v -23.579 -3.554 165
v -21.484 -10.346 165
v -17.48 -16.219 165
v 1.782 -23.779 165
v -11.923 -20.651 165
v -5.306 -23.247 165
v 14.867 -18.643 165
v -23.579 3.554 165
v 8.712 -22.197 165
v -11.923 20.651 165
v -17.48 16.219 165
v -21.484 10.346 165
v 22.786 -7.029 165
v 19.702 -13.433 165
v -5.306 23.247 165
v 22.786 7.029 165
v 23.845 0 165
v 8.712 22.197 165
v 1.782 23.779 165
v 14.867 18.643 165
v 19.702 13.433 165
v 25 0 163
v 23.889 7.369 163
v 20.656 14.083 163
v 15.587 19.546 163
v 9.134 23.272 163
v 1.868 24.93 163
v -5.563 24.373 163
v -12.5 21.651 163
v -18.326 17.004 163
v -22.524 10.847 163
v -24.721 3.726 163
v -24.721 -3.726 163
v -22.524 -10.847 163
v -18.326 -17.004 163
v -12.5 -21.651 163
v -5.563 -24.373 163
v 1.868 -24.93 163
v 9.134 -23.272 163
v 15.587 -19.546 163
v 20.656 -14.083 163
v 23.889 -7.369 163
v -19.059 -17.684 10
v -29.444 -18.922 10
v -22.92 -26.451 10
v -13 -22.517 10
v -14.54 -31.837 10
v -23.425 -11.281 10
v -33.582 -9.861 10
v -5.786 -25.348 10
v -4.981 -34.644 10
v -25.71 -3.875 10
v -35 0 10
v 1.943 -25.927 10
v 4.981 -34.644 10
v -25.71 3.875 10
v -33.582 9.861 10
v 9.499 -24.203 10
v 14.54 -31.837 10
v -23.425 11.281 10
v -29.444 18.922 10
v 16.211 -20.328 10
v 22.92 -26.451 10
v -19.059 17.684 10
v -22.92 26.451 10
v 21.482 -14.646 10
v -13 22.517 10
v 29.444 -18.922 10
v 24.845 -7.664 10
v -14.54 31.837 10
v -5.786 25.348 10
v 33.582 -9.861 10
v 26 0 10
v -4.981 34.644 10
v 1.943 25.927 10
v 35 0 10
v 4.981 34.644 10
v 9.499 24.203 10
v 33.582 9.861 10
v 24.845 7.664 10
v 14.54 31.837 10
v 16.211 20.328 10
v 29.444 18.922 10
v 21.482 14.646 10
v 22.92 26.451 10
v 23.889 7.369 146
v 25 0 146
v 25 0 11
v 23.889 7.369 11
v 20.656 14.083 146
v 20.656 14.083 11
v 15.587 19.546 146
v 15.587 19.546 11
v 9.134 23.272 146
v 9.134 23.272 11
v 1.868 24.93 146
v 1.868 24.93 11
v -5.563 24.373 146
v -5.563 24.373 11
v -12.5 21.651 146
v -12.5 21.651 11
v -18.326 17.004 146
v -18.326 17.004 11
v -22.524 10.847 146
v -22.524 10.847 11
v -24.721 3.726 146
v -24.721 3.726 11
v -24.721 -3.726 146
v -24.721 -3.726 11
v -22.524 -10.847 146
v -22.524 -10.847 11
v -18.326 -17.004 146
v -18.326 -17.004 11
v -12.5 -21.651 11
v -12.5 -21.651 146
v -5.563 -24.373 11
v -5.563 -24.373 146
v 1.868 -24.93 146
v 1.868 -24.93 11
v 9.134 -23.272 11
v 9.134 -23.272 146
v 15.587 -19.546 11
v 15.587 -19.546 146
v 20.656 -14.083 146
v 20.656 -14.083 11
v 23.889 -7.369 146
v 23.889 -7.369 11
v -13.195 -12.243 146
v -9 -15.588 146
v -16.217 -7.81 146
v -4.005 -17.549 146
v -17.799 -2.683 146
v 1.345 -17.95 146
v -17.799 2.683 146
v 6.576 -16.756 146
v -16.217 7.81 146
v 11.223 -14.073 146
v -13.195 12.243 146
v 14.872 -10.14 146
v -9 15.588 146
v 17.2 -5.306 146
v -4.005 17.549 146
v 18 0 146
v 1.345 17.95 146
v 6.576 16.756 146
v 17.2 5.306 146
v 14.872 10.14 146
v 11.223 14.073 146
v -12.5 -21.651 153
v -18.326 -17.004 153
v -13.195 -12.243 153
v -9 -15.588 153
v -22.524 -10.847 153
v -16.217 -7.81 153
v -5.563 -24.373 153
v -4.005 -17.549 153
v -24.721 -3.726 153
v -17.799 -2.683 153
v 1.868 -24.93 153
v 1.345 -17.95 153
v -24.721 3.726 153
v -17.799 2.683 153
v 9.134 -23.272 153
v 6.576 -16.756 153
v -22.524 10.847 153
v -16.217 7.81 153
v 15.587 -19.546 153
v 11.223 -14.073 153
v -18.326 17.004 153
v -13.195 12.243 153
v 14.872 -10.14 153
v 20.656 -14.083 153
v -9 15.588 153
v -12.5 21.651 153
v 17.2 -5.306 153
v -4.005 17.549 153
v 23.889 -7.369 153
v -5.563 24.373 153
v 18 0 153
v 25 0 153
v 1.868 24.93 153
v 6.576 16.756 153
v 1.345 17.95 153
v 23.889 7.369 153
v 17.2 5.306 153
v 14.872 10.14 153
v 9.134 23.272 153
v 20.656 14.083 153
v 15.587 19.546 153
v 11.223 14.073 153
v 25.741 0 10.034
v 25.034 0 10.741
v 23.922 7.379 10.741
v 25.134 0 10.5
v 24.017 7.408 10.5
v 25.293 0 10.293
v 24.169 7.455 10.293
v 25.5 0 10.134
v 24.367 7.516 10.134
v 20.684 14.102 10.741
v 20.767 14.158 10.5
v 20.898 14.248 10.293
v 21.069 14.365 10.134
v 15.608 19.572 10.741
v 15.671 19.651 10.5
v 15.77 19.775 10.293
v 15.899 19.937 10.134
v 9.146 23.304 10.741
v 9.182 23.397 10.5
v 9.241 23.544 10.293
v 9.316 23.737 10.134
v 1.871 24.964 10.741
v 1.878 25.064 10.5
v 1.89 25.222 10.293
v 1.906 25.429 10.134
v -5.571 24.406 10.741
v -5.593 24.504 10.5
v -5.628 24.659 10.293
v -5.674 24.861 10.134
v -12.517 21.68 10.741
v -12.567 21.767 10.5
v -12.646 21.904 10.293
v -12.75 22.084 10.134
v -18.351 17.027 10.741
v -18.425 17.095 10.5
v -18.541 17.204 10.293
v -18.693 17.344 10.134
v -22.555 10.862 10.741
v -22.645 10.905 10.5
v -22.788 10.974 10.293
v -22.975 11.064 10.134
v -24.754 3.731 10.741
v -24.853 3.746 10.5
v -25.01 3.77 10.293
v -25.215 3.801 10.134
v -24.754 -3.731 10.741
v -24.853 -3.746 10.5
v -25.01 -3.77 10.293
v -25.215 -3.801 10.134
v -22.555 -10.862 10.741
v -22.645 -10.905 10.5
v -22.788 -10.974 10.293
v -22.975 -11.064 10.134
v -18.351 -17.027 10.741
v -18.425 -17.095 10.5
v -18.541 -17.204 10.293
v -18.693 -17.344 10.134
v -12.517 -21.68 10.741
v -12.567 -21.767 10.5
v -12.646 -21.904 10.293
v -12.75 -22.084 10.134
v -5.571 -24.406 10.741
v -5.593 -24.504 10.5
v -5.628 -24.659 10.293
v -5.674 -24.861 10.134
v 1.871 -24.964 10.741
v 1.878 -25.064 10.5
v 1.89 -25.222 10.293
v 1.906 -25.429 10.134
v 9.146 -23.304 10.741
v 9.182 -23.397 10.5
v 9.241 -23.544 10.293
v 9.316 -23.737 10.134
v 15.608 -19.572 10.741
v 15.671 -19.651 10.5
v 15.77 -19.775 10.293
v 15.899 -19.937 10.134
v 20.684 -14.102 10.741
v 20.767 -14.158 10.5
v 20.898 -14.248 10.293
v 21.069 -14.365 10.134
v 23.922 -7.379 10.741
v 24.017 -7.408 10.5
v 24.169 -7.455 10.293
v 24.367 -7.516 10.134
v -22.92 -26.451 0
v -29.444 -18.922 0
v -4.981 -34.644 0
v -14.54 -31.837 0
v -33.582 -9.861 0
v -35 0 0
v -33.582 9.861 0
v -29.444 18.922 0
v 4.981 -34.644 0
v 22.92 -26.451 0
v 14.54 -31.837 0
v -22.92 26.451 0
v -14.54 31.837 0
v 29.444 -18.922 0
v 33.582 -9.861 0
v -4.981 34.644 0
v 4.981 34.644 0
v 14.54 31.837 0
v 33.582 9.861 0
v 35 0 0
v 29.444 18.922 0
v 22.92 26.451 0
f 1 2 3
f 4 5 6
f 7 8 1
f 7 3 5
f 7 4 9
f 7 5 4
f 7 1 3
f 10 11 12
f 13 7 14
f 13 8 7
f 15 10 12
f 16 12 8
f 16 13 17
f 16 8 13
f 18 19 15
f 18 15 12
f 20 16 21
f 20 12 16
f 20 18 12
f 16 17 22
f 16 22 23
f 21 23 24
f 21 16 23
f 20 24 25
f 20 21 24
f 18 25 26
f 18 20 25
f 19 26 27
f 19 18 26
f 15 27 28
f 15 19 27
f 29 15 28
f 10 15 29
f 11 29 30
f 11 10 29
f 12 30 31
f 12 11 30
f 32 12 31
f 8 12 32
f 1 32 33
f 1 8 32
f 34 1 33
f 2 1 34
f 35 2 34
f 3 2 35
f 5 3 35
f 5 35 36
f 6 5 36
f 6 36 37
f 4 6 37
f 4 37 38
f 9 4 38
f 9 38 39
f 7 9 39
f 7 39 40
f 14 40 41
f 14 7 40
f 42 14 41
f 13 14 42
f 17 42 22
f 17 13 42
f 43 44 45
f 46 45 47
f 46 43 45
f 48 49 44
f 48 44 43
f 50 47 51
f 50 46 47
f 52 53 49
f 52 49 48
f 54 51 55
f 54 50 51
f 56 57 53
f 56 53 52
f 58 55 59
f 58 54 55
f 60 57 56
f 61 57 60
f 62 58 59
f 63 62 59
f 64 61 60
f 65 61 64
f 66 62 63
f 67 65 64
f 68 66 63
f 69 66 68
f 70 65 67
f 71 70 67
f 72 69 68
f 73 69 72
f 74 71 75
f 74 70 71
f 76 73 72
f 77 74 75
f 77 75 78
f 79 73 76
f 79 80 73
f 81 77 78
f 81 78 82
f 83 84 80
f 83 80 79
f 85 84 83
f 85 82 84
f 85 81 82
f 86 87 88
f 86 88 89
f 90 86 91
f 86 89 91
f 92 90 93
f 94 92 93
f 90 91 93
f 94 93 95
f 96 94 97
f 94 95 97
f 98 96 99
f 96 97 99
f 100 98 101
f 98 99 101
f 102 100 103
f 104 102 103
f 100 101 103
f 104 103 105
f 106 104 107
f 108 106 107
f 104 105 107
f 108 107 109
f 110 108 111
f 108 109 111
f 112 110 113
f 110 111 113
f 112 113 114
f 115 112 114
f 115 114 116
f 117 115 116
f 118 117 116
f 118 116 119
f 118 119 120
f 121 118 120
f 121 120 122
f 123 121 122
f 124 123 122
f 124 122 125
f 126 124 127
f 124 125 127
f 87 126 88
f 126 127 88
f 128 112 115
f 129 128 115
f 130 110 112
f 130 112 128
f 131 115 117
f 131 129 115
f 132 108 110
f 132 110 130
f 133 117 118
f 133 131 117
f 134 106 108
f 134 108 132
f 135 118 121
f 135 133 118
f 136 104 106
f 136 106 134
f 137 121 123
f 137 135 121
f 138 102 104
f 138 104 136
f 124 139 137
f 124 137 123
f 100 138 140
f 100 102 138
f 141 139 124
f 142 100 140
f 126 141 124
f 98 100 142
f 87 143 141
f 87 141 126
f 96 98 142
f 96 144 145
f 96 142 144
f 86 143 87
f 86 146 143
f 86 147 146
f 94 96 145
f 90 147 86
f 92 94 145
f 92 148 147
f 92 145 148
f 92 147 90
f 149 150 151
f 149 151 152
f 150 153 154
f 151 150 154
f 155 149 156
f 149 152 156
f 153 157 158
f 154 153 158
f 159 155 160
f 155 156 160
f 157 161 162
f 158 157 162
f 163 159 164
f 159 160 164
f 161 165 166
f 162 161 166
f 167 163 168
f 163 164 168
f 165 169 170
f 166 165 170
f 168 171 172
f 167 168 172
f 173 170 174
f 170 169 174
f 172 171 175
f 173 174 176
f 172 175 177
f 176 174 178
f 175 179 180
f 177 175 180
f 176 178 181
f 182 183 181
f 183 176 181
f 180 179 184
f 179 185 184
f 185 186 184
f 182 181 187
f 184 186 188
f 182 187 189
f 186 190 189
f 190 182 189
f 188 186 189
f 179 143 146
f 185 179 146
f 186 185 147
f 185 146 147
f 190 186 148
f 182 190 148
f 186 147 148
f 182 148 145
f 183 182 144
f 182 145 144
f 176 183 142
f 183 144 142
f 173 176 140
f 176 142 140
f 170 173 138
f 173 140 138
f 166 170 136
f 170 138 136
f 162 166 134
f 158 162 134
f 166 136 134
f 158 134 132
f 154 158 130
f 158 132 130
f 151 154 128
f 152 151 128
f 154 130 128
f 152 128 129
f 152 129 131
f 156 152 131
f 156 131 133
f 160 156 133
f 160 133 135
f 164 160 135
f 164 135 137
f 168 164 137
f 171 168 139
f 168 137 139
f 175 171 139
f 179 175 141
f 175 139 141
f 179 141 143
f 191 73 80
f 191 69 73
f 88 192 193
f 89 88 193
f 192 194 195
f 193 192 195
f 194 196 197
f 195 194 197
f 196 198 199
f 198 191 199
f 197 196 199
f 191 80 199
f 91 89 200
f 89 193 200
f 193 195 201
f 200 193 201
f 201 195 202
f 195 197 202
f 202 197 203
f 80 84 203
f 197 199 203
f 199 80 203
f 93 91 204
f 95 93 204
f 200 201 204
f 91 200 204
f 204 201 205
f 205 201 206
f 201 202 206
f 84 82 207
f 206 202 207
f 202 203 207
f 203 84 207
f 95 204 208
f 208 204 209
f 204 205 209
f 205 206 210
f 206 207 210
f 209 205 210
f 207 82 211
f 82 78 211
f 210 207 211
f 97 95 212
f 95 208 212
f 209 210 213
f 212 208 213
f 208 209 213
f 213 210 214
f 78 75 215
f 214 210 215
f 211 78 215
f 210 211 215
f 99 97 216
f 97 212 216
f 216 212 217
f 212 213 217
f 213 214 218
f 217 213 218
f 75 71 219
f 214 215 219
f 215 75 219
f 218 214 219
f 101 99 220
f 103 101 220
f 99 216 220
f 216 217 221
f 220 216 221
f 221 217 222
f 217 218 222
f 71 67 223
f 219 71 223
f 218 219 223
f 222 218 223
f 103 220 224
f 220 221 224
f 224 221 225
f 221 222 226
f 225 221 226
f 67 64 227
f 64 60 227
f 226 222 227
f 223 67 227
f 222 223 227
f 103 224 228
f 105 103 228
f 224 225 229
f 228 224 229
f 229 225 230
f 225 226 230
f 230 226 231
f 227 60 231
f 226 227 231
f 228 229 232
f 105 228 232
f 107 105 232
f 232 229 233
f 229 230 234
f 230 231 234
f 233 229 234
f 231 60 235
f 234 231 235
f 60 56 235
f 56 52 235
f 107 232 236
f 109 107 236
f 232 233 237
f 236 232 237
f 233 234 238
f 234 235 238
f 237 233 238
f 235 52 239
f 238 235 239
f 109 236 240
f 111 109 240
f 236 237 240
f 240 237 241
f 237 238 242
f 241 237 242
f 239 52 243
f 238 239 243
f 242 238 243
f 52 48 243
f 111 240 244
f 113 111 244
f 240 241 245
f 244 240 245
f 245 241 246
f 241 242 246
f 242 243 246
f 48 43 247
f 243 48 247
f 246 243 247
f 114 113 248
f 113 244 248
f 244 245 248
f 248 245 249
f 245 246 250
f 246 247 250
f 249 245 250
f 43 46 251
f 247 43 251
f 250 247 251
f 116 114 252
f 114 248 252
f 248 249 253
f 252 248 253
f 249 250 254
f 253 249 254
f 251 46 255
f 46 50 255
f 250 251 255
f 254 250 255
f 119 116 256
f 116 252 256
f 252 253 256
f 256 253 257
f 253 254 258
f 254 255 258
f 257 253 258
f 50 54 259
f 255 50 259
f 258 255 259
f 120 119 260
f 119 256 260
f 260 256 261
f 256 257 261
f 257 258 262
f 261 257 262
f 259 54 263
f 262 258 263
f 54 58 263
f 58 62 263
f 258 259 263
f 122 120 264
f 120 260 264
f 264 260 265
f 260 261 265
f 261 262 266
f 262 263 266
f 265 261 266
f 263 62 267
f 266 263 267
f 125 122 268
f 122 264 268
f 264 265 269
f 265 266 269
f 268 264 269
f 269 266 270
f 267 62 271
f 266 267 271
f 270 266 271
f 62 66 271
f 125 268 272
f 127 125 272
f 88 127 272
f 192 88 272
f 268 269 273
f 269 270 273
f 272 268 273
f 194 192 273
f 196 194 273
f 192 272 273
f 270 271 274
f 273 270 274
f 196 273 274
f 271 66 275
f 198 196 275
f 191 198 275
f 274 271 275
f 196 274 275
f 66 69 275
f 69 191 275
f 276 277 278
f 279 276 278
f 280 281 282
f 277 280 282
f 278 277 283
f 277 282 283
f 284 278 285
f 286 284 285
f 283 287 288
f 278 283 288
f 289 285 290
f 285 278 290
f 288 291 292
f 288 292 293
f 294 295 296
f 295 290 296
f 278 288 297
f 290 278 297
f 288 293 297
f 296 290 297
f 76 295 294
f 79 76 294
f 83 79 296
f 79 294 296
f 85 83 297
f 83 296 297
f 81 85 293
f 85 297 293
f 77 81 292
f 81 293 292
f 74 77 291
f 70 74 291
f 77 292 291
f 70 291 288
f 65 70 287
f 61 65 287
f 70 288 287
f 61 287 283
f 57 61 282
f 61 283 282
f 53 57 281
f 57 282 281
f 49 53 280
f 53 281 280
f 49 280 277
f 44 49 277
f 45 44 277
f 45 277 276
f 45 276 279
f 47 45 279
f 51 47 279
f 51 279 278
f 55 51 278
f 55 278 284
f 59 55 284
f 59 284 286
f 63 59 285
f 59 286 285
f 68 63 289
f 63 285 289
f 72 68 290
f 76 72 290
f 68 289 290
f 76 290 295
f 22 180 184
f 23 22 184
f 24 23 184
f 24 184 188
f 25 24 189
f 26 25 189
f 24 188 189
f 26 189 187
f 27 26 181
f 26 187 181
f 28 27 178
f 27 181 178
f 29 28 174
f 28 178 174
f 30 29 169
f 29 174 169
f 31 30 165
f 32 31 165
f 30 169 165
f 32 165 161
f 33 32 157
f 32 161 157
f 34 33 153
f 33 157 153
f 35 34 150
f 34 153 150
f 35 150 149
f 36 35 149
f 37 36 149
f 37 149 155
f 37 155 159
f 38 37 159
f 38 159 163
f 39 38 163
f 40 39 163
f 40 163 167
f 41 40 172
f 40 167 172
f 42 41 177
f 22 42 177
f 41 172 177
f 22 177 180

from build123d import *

# Parameters (mm, degrees)
SKETCH_1_R      = 35
EXTRUDE_1_DEPTH = 10
SKETCH_2_R      = 25
EXTRUDE_2_DEPTH = 136
SKETCH_3_R      = 18
EXTRUDE_3_DEPTH = 7
SKETCH_4_R      = 25
EXTRUDE_4_DEPTH = 12
CHAMFER_1_SIZE  = 2
CHAMFER_1_SIZE2 = 1.154700538
FILLET_1_R      = 1


with BuildPart() as part:
    # 草图1 → 凸台-拉伸1 (new body)
    with BuildSketch(Plane.XY):
        Circle(SKETCH_1_R)
    extrude(amount=EXTRUDE_1_DEPTH)

    # 草图2 → 凸台-拉伸2 (add)
    with BuildSketch(Plane.XY.offset(10)):
        Circle(SKETCH_2_R)
    extrude(amount=EXTRUDE_2_DEPTH)

    # 草图3 → 凸台-拉伸3 (add)
    with BuildSketch(Plane.XY.offset(146)):
        Circle(SKETCH_3_R)
    extrude(amount=EXTRUDE_3_DEPTH)

    # 草图4 → 凸台-拉伸4 (add)
    with BuildSketch(Plane.XY.offset(153)):
        Circle(SKETCH_4_R)
    extrude(amount=EXTRUDE_4_DEPTH)

    # 倒角1
    chamfer_1_edges = [part.edges().sort_by_distance(p)[0] for p in [
        (-25, 0, 165),
    ]]
    chamfer_1_side = [part.faces().sort_by_distance(p)[0] for p in [
        (-25, 0, 159),
    ]]
    chamfer(chamfer_1_edges, length=CHAMFER_1_SIZE, length2=CHAMFER_1_SIZE2, reference=chamfer_1_side[0])

    # 圆角1
    fillet_1_edges = [part.edges().sort_by_distance(p)[0] for p in [
        (-25, 0, 10),
    ]]
    fillet(fillet_1_edges, radius=FILLET_1_R)


solid = part.part
